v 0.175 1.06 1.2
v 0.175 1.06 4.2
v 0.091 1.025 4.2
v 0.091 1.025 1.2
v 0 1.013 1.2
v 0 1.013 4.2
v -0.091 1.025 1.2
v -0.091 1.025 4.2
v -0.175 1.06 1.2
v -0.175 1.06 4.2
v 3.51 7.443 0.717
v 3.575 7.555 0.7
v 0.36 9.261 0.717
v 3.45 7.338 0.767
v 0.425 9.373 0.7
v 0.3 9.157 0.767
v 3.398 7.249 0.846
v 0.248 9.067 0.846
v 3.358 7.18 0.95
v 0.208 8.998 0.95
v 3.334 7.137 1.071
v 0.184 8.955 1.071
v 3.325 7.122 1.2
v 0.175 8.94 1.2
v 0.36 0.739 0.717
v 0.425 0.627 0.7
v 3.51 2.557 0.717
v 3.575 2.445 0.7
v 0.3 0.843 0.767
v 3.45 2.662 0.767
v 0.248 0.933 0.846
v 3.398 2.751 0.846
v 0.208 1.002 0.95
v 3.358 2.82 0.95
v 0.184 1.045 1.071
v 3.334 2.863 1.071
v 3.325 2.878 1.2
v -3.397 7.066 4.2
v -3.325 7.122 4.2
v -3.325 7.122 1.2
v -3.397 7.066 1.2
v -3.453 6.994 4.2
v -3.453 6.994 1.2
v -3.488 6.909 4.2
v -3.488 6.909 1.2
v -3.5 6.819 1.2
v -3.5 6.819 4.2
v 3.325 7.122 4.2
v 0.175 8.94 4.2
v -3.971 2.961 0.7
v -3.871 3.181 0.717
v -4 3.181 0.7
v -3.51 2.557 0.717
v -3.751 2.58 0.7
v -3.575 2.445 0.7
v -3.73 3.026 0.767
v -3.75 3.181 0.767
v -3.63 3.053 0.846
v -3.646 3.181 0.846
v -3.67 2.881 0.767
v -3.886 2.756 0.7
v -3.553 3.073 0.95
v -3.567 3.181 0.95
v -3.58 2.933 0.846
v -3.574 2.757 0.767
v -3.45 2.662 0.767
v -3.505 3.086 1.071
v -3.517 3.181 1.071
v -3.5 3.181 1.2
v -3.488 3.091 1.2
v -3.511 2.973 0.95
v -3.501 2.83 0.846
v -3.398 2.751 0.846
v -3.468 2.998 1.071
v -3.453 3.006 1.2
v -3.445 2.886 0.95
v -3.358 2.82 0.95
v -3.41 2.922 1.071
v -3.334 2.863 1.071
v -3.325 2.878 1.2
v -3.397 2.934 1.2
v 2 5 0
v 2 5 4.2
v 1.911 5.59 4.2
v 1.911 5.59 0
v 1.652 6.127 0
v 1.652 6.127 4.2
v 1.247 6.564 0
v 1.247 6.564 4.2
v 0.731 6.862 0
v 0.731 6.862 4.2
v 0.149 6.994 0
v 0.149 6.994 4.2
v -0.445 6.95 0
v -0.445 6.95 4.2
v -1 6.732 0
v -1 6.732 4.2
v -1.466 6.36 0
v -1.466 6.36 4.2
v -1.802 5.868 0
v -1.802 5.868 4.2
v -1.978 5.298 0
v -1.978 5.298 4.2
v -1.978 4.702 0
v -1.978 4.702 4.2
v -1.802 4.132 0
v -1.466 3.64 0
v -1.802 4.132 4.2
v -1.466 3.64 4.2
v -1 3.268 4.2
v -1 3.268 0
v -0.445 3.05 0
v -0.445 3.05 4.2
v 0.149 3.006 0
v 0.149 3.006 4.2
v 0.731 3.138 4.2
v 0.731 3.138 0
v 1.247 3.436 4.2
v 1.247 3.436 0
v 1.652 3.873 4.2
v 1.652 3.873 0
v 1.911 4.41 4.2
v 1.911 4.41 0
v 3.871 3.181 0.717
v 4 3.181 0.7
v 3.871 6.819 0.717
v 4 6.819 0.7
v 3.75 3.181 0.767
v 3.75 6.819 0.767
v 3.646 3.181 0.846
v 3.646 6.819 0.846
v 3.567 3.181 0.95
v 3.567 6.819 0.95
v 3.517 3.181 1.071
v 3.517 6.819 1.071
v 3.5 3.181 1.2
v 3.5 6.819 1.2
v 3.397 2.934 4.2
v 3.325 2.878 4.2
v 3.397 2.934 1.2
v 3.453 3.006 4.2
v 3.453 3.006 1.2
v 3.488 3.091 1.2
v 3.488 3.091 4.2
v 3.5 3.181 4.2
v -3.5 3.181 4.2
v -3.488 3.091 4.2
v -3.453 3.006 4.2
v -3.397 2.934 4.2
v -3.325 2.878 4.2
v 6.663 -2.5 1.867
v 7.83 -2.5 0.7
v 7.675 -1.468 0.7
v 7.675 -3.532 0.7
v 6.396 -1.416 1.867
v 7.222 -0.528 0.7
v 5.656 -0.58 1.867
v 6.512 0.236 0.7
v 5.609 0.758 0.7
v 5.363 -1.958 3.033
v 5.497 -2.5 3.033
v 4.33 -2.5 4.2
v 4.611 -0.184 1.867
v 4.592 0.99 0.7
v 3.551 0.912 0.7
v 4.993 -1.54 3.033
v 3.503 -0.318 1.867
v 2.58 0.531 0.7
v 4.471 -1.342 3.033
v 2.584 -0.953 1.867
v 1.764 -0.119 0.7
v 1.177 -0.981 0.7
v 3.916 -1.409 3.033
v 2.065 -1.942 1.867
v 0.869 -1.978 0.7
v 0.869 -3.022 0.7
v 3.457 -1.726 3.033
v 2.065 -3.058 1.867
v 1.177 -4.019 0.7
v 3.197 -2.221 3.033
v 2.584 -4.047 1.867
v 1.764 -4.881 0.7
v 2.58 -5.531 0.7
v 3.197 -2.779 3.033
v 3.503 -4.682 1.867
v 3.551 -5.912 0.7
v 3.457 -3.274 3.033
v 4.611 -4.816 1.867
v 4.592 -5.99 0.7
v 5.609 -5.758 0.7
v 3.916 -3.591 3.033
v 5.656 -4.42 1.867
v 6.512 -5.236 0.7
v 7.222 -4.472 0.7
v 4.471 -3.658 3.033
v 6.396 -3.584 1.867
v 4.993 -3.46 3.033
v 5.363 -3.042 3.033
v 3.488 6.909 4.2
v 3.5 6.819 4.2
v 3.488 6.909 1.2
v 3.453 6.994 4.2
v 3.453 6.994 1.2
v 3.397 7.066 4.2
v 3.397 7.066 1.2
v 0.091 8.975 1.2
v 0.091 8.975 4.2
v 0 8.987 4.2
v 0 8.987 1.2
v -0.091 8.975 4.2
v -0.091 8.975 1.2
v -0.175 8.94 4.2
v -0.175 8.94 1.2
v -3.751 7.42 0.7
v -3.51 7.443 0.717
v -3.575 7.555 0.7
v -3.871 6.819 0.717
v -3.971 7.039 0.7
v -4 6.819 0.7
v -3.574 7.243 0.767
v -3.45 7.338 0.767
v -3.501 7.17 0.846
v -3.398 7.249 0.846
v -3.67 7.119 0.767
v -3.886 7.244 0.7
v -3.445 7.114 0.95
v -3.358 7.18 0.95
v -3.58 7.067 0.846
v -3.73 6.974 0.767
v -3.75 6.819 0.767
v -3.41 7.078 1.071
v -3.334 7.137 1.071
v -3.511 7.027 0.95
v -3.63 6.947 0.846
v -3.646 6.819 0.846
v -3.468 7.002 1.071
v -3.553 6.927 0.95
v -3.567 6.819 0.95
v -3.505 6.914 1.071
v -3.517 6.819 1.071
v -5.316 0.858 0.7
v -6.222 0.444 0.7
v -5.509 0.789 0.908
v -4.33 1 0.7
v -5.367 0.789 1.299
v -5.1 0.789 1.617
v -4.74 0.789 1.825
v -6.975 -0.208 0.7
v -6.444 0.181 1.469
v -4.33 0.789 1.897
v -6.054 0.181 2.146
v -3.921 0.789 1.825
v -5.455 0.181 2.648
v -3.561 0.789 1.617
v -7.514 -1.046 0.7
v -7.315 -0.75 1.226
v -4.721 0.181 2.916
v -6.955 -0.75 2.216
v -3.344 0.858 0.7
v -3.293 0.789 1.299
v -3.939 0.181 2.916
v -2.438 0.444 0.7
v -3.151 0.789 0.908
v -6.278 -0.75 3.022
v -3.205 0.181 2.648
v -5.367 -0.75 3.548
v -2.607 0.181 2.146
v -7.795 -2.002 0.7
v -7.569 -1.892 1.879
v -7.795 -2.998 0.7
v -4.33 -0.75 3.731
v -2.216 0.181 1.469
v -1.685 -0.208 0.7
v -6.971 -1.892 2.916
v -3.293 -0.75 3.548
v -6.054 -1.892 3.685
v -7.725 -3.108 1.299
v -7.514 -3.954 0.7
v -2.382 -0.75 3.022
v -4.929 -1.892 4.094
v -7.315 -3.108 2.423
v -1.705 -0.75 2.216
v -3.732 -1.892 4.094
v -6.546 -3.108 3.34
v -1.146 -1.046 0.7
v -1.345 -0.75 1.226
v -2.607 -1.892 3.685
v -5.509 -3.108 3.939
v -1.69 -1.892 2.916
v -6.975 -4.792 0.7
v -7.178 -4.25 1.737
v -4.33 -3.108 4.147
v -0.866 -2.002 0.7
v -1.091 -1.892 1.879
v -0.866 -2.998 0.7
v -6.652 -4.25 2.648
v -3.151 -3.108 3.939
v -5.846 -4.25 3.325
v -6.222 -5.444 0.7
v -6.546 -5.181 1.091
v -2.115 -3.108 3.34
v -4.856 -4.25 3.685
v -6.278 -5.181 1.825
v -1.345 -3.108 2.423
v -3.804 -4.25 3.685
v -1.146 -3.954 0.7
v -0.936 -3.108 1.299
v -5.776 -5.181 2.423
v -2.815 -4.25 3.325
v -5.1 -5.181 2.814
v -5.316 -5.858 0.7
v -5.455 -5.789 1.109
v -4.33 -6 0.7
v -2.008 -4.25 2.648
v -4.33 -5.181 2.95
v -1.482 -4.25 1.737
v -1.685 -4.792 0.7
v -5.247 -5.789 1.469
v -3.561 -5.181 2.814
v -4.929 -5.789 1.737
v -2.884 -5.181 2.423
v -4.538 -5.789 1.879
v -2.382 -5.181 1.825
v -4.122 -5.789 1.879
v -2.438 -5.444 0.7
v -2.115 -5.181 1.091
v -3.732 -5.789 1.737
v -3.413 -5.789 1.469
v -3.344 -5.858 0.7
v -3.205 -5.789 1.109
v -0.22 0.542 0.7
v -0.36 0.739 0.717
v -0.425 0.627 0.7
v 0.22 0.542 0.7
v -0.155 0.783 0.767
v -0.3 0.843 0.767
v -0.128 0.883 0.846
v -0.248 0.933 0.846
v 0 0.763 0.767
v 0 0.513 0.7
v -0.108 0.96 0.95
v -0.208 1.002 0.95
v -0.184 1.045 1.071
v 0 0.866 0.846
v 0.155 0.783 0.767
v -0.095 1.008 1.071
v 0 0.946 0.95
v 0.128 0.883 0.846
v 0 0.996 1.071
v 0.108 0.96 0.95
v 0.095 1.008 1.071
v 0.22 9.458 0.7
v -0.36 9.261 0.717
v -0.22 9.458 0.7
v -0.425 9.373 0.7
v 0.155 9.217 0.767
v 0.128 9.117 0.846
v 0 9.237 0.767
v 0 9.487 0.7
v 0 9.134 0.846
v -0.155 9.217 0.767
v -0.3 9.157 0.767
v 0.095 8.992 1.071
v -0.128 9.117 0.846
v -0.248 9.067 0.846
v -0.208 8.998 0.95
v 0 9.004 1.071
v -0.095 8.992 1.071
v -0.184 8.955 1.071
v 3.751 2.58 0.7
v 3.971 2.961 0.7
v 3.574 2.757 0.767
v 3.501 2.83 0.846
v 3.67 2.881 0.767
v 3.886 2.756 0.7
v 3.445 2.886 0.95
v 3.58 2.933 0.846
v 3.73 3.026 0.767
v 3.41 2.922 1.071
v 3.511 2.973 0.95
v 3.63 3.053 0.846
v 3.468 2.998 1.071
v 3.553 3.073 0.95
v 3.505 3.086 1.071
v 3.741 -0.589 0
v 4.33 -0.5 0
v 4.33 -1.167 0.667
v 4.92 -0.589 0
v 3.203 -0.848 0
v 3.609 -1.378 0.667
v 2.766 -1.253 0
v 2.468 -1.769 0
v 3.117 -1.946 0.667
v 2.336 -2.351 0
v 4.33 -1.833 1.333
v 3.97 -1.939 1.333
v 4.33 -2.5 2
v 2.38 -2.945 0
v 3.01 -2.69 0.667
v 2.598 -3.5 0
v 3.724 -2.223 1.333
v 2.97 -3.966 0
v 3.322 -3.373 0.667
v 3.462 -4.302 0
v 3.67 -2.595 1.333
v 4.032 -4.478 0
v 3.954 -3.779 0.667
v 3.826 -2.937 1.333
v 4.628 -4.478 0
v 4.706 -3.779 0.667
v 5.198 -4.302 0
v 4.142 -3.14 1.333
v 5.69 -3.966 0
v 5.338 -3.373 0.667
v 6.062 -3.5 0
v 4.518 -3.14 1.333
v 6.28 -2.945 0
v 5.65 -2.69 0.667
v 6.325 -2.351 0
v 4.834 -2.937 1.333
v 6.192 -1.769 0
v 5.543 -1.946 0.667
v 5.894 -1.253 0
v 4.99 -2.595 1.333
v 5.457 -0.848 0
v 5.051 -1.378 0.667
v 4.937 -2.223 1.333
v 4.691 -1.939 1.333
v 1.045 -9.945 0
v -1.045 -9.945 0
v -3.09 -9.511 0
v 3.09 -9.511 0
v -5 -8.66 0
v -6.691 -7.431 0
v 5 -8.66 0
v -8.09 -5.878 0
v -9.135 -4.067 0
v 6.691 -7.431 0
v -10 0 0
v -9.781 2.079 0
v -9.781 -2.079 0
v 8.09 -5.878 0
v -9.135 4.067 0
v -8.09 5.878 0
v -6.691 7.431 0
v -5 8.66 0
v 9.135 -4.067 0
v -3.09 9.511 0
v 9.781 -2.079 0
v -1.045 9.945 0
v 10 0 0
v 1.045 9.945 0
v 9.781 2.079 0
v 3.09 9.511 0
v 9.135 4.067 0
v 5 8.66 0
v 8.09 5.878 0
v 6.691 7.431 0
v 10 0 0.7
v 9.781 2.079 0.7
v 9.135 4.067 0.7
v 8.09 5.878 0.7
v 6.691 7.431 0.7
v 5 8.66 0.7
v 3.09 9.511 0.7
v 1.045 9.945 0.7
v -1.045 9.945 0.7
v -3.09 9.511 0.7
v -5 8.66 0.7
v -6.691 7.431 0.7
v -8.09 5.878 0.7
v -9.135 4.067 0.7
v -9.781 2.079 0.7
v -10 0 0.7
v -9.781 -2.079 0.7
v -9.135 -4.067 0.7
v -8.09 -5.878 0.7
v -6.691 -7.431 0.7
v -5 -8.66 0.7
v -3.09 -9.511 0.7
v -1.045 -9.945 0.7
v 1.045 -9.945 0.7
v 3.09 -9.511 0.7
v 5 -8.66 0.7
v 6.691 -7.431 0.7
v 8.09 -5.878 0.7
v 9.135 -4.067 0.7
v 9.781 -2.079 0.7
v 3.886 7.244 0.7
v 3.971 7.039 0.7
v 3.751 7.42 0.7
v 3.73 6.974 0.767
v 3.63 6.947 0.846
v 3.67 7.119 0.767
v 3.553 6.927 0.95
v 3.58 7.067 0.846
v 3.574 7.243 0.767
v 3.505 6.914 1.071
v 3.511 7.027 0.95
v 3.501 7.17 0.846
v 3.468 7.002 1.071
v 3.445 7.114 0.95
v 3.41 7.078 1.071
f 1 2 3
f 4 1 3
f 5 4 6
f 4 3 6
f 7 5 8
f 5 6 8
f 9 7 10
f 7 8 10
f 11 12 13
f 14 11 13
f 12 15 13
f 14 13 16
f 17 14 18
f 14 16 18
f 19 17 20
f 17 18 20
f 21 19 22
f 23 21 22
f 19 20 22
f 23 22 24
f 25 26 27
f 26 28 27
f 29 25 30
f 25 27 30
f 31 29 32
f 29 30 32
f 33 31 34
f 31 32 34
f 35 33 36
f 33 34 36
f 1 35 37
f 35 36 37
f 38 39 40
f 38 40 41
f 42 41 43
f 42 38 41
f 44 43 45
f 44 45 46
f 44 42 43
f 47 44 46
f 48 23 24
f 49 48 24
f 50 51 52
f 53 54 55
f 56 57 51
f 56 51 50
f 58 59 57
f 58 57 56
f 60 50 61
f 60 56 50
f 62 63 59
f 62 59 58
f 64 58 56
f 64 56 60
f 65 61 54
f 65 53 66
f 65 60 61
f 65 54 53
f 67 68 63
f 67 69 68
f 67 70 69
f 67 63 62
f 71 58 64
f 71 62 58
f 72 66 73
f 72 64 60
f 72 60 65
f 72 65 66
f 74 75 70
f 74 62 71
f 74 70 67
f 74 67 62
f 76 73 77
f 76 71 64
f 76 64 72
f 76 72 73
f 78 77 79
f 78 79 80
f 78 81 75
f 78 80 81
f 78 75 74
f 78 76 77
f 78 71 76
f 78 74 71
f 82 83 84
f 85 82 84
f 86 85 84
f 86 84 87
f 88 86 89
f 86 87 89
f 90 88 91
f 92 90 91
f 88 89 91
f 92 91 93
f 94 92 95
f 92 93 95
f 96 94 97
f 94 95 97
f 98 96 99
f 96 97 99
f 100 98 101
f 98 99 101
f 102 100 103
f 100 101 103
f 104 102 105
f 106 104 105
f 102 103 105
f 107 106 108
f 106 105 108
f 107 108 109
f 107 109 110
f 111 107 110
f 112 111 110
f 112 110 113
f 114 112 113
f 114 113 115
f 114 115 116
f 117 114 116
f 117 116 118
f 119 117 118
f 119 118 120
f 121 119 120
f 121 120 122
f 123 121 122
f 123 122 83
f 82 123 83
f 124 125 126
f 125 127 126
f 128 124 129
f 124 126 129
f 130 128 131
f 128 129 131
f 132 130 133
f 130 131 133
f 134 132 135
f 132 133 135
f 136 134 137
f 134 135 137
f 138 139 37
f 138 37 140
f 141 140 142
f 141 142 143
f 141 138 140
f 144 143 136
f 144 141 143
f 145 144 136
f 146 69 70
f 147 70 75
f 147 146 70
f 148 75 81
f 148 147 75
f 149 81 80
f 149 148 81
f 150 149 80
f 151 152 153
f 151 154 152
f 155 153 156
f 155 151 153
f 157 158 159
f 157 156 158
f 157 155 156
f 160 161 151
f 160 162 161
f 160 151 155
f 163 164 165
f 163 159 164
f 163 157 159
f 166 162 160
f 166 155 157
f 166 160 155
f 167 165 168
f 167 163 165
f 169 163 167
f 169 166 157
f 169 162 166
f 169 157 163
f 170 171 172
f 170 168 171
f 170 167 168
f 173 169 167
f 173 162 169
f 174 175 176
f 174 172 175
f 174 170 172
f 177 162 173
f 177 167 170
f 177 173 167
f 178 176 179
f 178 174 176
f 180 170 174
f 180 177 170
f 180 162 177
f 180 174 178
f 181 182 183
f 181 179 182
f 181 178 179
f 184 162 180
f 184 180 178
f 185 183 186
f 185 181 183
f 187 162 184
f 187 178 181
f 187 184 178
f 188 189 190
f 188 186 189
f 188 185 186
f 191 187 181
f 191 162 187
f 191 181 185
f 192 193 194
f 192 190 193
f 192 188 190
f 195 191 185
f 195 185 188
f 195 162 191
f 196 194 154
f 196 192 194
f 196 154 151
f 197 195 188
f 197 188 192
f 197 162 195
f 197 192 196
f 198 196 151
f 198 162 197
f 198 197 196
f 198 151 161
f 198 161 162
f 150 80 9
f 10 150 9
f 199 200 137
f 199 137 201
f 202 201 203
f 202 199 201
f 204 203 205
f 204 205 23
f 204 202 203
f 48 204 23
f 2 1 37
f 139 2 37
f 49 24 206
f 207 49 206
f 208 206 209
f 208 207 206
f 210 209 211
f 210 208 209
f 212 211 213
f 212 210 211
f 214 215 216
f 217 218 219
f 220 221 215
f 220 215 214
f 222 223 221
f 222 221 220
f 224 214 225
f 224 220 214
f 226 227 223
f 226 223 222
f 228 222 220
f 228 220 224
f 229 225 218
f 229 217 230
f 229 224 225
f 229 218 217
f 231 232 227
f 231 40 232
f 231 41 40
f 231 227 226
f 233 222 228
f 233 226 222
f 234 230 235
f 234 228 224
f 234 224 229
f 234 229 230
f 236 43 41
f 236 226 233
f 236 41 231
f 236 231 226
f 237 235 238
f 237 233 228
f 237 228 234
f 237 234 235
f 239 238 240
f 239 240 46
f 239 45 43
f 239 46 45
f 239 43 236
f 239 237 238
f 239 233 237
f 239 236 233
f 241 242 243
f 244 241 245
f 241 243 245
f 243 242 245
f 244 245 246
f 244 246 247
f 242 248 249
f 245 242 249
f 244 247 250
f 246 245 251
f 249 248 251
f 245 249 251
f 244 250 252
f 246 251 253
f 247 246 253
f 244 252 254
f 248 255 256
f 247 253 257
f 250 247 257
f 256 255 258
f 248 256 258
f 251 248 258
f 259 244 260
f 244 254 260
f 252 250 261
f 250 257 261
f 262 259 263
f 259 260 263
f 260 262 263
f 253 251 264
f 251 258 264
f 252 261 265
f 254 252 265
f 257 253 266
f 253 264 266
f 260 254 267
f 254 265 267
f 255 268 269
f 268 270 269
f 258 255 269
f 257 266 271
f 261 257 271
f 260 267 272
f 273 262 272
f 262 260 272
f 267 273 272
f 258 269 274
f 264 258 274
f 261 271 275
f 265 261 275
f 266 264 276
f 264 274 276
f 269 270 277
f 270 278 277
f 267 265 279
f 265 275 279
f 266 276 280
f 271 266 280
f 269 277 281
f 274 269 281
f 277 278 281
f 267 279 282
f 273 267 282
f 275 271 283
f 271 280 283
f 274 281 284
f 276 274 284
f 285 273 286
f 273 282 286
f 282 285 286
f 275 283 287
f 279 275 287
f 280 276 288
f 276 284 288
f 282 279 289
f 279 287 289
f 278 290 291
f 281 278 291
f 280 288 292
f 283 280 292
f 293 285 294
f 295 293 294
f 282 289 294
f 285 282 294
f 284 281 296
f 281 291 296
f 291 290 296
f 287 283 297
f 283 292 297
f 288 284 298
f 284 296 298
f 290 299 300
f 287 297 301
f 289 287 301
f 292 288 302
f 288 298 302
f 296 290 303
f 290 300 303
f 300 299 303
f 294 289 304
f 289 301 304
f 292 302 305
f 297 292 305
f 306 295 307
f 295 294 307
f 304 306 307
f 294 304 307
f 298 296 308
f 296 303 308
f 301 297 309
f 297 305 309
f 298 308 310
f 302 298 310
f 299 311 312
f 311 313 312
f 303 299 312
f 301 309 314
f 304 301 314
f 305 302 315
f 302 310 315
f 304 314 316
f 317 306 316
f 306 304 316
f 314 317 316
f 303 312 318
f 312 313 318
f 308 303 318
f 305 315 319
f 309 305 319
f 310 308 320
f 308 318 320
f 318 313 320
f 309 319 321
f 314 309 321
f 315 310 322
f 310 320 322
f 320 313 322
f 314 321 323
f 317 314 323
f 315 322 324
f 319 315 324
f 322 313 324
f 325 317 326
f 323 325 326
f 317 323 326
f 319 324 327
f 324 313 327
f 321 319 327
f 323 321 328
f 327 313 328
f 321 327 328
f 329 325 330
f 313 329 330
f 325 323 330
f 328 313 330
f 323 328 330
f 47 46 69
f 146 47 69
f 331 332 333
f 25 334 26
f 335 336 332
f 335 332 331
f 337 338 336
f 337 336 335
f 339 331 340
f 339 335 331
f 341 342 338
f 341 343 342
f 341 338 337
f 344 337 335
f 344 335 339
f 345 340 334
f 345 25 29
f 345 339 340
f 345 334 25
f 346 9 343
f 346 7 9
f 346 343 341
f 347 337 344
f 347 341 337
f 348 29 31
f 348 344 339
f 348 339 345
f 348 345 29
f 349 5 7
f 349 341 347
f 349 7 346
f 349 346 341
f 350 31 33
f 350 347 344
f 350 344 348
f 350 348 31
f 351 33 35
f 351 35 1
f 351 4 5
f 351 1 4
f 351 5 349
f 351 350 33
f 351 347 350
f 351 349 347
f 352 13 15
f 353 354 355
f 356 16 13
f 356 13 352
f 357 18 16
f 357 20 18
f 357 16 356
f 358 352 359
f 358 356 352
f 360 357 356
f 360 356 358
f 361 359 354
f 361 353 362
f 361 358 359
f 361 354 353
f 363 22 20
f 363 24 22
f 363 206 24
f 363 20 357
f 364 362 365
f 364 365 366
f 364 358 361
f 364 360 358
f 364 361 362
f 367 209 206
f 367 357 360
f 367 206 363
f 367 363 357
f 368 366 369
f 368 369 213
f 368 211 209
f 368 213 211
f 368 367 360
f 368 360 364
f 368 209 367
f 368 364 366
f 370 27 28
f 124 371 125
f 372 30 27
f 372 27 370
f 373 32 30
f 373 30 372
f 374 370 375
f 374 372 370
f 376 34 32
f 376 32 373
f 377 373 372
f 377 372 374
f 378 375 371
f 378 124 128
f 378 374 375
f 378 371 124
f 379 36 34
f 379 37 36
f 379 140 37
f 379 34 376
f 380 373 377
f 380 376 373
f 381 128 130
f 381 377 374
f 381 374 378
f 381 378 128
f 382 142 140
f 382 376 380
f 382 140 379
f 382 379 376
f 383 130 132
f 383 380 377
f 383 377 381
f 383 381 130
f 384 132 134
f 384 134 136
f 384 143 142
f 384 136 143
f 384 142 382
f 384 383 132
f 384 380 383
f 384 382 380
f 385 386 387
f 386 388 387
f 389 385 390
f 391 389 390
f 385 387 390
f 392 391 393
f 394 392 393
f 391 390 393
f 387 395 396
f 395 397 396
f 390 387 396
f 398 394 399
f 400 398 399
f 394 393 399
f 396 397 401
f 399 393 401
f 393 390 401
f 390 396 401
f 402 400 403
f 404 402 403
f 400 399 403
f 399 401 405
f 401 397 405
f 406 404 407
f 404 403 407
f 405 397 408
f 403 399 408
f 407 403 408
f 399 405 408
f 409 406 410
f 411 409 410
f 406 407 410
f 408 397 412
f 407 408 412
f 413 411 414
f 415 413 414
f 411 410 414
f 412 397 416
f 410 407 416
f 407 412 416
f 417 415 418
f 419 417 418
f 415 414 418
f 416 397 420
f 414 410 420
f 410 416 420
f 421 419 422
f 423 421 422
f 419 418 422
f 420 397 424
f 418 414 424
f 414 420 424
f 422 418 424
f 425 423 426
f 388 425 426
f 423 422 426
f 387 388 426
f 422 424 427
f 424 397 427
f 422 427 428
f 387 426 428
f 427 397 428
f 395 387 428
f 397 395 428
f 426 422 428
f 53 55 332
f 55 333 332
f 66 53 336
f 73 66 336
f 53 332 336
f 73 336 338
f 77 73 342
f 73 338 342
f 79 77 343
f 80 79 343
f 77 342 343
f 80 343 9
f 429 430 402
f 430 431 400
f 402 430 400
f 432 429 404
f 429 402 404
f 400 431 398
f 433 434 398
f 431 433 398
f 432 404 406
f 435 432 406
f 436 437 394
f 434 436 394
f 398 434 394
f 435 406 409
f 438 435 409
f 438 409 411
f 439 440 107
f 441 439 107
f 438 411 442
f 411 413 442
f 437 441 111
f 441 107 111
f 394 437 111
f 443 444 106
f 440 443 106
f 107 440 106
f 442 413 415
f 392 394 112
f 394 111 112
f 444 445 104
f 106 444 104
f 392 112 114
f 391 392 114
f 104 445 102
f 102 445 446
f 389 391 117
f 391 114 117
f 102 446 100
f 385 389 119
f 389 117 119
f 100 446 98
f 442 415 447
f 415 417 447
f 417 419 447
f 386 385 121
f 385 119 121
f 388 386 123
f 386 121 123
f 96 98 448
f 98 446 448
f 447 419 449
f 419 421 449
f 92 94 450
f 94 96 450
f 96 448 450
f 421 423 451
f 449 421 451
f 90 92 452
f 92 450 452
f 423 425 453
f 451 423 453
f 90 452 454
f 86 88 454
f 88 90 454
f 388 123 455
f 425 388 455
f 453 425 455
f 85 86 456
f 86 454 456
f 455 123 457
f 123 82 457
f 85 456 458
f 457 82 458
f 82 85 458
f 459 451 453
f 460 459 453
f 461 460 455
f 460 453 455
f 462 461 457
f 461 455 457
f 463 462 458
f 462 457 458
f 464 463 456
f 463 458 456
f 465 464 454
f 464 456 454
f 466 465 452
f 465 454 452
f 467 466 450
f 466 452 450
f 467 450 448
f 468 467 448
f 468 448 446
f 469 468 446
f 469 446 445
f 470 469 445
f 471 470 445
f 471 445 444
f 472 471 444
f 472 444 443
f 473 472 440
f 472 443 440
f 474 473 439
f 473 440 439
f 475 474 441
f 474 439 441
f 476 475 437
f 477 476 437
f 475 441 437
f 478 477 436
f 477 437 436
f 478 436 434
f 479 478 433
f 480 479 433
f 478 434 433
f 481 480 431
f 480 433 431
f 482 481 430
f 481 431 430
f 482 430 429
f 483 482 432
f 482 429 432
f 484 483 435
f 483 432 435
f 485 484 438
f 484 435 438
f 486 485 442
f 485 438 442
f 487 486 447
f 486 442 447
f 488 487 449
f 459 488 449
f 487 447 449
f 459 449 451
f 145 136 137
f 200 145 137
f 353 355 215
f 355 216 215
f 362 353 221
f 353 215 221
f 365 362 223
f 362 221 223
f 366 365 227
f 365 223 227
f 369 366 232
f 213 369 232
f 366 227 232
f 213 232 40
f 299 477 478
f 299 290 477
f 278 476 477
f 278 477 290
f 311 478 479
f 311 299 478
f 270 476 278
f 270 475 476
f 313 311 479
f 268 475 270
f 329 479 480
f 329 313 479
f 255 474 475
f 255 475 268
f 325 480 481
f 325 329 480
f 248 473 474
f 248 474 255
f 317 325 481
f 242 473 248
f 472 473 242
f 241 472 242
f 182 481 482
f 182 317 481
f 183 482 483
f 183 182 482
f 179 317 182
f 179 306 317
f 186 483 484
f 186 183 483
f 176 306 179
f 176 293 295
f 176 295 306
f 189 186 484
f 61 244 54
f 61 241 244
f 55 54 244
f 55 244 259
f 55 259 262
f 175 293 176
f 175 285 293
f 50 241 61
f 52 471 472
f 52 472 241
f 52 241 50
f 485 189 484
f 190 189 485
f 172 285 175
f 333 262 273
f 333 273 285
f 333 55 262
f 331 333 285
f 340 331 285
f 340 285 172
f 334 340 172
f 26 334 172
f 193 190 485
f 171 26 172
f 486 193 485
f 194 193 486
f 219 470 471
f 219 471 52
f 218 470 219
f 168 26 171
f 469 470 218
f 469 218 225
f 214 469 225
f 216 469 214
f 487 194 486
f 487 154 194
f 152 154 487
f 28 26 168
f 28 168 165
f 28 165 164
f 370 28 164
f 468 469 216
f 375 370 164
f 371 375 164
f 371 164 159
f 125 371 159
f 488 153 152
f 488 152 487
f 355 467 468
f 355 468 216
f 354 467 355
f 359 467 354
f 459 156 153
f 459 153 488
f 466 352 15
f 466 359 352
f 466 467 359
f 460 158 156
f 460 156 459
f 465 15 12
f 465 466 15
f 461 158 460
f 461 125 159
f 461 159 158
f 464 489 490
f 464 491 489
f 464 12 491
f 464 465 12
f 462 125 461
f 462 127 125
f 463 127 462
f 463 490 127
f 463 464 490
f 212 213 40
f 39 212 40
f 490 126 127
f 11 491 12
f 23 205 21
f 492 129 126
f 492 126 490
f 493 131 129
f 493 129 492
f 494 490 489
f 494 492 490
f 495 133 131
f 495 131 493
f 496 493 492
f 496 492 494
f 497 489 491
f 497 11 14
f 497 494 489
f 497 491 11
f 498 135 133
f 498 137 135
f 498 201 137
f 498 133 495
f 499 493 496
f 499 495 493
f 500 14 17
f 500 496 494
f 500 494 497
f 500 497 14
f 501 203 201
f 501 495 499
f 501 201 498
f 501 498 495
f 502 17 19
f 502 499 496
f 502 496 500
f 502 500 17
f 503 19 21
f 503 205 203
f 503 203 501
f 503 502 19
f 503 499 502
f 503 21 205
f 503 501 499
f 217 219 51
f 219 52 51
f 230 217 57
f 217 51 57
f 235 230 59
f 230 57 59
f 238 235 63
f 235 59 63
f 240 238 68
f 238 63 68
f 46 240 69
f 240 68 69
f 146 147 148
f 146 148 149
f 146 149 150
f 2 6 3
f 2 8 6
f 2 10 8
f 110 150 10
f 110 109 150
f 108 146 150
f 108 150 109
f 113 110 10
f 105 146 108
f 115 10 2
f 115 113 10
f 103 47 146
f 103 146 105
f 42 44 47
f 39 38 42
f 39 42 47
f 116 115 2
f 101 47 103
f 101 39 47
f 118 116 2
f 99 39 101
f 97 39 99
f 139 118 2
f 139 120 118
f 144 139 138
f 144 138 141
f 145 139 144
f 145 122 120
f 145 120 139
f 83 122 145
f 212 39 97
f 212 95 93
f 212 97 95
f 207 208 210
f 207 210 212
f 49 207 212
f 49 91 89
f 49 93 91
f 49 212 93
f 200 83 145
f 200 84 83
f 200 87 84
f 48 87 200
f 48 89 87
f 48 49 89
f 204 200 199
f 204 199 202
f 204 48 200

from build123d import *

# Parameters (mm, degrees)
SKETCH1_R           = 10
BOSS_EXTRUDE1_DEPTH = 0.7
REVOLVE1_ANGLE      = 180
SKETCH2_5_R         = 3.5
BOSS_EXTRUDE2_DEPTH = 5
BOSS_EXTRUDE2_TAPER = 45
BOSS_EXTRUDE3_DEPTH = 3.5
FILLET1_R           = 0.35
SKETCH3_R           = 2
CUT_EXTRUDE1_DEPTH  = 10
FILLET2_R           = 0.5


with BuildPart() as part:
    # Sketch1 → Boss-Extrude1 (new body)
    with BuildSketch(Plane.XY):
        Circle(SKETCH1_R)
    extrude(amount=BOSS_EXTRUDE1_DEPTH)

    # Sketch2 → Revolve1 (revolve)
    with BuildSketch(Plane.XY.offset(0.7)):
        with BuildLine():
            Line((-4.330127019, -6), (-4.330127019, 1))
            ThreePointArc((-4.330127019, 1), (-7.830127019, -2.5), (-4.330127019, -6))
        make_face()
    revolve(axis=Axis((-4.330127019, -6, 0.7), (0, 1, 0)), revolution_arc=REVOLVE1_ANGLE)

    # Sketch2<5> → Boss-Extrude2 (add)
    with BuildSketch(Plane.XY.offset(0.7)):
        with Locations((4.330127019, -2.5)):
            Circle(SKETCH2_5_R)
    extrude(amount=BOSS_EXTRUDE2_DEPTH, taper=BOSS_EXTRUDE2_TAPER)

    # Sketch2<6> → Boss-Extrude3 (add)
    with BuildSketch(Plane.XY.offset(0.7)):
        Polygon((0, 0.958548116), (3.5, 2.979274058), (3.5, 7.020725942), (0, 9.041451884), (-3.5, 7.020725942), (-3.5, 2.979274058), align=None)
    extrude(amount=BOSS_EXTRUDE3_DEPTH)

    # Fillet1
    fillet1_edges = [part.edges().sort_by_distance(p)[0] for p in [
        (-3.5, 7.020725942, 2.45),
        (-3.5, 2.979274058, 2.45),
        (0, 0.958548116, 2.45),
        (3.5, 2.979274058, 2.45),
        (3.5, 7.020725942, 2.45),
        (0, 9.041451884, 2.45),
    ]]
    fillet(fillet1_edges, radius=FILLET1_R)

    # Sketch3 → Cut-Extrude1 (cut)
    with BuildSketch(Plane.XY.offset(4.2)):
        with Locations((0, 5)):
            Circle(SKETCH3_R)
    extrude(amount=-CUT_EXTRUDE1_DEPTH, mode=Mode.SUBTRACT)

    # Fillet2
    fillet2_edges = [part.edges().sort_by_distance(p)[0] for p in [
        (-1.75, 8.031088913, 0.7),
        (1.75, 8.031088913, 0.7),
        (-3.5, 5, 0.7),
        (-1.75, 1.968911087, 0.7),
        (3.5, 5, 0.7),
        (1.75, 1.968911087, 0.7),
        (0, 8.987306696, 0.7),
        (-3.453108891, 6.993653348, 0.7),
        (-3.453108891, 3.006346652, 0.7),
        (3.453108891, 6.993653348, 0.7),
        (3.453108891, 3.006346652, 0.7),
        (0, 1.012693304, 0.7),
    ]]
    fillet(fillet2_edges, radius=FILLET2_R)

    # Cut-Extrude2 cone 1 section (through the dimple's axis) → Cut-Extrude2 (revolve, cut)
    with BuildSketch(Plane(origin=(4.330127019, -2.5, 0), x_dir=(0, 1, 0), z_dir=(1, 0, 0))):
        Polygon((0, 0), (2, 0), (0, 2), align=None)
    revolve(axis=Axis((4.330127019, -2.5, 0), (0, 0, 1)), mode=Mode.SUBTRACT)


solid = part.part
